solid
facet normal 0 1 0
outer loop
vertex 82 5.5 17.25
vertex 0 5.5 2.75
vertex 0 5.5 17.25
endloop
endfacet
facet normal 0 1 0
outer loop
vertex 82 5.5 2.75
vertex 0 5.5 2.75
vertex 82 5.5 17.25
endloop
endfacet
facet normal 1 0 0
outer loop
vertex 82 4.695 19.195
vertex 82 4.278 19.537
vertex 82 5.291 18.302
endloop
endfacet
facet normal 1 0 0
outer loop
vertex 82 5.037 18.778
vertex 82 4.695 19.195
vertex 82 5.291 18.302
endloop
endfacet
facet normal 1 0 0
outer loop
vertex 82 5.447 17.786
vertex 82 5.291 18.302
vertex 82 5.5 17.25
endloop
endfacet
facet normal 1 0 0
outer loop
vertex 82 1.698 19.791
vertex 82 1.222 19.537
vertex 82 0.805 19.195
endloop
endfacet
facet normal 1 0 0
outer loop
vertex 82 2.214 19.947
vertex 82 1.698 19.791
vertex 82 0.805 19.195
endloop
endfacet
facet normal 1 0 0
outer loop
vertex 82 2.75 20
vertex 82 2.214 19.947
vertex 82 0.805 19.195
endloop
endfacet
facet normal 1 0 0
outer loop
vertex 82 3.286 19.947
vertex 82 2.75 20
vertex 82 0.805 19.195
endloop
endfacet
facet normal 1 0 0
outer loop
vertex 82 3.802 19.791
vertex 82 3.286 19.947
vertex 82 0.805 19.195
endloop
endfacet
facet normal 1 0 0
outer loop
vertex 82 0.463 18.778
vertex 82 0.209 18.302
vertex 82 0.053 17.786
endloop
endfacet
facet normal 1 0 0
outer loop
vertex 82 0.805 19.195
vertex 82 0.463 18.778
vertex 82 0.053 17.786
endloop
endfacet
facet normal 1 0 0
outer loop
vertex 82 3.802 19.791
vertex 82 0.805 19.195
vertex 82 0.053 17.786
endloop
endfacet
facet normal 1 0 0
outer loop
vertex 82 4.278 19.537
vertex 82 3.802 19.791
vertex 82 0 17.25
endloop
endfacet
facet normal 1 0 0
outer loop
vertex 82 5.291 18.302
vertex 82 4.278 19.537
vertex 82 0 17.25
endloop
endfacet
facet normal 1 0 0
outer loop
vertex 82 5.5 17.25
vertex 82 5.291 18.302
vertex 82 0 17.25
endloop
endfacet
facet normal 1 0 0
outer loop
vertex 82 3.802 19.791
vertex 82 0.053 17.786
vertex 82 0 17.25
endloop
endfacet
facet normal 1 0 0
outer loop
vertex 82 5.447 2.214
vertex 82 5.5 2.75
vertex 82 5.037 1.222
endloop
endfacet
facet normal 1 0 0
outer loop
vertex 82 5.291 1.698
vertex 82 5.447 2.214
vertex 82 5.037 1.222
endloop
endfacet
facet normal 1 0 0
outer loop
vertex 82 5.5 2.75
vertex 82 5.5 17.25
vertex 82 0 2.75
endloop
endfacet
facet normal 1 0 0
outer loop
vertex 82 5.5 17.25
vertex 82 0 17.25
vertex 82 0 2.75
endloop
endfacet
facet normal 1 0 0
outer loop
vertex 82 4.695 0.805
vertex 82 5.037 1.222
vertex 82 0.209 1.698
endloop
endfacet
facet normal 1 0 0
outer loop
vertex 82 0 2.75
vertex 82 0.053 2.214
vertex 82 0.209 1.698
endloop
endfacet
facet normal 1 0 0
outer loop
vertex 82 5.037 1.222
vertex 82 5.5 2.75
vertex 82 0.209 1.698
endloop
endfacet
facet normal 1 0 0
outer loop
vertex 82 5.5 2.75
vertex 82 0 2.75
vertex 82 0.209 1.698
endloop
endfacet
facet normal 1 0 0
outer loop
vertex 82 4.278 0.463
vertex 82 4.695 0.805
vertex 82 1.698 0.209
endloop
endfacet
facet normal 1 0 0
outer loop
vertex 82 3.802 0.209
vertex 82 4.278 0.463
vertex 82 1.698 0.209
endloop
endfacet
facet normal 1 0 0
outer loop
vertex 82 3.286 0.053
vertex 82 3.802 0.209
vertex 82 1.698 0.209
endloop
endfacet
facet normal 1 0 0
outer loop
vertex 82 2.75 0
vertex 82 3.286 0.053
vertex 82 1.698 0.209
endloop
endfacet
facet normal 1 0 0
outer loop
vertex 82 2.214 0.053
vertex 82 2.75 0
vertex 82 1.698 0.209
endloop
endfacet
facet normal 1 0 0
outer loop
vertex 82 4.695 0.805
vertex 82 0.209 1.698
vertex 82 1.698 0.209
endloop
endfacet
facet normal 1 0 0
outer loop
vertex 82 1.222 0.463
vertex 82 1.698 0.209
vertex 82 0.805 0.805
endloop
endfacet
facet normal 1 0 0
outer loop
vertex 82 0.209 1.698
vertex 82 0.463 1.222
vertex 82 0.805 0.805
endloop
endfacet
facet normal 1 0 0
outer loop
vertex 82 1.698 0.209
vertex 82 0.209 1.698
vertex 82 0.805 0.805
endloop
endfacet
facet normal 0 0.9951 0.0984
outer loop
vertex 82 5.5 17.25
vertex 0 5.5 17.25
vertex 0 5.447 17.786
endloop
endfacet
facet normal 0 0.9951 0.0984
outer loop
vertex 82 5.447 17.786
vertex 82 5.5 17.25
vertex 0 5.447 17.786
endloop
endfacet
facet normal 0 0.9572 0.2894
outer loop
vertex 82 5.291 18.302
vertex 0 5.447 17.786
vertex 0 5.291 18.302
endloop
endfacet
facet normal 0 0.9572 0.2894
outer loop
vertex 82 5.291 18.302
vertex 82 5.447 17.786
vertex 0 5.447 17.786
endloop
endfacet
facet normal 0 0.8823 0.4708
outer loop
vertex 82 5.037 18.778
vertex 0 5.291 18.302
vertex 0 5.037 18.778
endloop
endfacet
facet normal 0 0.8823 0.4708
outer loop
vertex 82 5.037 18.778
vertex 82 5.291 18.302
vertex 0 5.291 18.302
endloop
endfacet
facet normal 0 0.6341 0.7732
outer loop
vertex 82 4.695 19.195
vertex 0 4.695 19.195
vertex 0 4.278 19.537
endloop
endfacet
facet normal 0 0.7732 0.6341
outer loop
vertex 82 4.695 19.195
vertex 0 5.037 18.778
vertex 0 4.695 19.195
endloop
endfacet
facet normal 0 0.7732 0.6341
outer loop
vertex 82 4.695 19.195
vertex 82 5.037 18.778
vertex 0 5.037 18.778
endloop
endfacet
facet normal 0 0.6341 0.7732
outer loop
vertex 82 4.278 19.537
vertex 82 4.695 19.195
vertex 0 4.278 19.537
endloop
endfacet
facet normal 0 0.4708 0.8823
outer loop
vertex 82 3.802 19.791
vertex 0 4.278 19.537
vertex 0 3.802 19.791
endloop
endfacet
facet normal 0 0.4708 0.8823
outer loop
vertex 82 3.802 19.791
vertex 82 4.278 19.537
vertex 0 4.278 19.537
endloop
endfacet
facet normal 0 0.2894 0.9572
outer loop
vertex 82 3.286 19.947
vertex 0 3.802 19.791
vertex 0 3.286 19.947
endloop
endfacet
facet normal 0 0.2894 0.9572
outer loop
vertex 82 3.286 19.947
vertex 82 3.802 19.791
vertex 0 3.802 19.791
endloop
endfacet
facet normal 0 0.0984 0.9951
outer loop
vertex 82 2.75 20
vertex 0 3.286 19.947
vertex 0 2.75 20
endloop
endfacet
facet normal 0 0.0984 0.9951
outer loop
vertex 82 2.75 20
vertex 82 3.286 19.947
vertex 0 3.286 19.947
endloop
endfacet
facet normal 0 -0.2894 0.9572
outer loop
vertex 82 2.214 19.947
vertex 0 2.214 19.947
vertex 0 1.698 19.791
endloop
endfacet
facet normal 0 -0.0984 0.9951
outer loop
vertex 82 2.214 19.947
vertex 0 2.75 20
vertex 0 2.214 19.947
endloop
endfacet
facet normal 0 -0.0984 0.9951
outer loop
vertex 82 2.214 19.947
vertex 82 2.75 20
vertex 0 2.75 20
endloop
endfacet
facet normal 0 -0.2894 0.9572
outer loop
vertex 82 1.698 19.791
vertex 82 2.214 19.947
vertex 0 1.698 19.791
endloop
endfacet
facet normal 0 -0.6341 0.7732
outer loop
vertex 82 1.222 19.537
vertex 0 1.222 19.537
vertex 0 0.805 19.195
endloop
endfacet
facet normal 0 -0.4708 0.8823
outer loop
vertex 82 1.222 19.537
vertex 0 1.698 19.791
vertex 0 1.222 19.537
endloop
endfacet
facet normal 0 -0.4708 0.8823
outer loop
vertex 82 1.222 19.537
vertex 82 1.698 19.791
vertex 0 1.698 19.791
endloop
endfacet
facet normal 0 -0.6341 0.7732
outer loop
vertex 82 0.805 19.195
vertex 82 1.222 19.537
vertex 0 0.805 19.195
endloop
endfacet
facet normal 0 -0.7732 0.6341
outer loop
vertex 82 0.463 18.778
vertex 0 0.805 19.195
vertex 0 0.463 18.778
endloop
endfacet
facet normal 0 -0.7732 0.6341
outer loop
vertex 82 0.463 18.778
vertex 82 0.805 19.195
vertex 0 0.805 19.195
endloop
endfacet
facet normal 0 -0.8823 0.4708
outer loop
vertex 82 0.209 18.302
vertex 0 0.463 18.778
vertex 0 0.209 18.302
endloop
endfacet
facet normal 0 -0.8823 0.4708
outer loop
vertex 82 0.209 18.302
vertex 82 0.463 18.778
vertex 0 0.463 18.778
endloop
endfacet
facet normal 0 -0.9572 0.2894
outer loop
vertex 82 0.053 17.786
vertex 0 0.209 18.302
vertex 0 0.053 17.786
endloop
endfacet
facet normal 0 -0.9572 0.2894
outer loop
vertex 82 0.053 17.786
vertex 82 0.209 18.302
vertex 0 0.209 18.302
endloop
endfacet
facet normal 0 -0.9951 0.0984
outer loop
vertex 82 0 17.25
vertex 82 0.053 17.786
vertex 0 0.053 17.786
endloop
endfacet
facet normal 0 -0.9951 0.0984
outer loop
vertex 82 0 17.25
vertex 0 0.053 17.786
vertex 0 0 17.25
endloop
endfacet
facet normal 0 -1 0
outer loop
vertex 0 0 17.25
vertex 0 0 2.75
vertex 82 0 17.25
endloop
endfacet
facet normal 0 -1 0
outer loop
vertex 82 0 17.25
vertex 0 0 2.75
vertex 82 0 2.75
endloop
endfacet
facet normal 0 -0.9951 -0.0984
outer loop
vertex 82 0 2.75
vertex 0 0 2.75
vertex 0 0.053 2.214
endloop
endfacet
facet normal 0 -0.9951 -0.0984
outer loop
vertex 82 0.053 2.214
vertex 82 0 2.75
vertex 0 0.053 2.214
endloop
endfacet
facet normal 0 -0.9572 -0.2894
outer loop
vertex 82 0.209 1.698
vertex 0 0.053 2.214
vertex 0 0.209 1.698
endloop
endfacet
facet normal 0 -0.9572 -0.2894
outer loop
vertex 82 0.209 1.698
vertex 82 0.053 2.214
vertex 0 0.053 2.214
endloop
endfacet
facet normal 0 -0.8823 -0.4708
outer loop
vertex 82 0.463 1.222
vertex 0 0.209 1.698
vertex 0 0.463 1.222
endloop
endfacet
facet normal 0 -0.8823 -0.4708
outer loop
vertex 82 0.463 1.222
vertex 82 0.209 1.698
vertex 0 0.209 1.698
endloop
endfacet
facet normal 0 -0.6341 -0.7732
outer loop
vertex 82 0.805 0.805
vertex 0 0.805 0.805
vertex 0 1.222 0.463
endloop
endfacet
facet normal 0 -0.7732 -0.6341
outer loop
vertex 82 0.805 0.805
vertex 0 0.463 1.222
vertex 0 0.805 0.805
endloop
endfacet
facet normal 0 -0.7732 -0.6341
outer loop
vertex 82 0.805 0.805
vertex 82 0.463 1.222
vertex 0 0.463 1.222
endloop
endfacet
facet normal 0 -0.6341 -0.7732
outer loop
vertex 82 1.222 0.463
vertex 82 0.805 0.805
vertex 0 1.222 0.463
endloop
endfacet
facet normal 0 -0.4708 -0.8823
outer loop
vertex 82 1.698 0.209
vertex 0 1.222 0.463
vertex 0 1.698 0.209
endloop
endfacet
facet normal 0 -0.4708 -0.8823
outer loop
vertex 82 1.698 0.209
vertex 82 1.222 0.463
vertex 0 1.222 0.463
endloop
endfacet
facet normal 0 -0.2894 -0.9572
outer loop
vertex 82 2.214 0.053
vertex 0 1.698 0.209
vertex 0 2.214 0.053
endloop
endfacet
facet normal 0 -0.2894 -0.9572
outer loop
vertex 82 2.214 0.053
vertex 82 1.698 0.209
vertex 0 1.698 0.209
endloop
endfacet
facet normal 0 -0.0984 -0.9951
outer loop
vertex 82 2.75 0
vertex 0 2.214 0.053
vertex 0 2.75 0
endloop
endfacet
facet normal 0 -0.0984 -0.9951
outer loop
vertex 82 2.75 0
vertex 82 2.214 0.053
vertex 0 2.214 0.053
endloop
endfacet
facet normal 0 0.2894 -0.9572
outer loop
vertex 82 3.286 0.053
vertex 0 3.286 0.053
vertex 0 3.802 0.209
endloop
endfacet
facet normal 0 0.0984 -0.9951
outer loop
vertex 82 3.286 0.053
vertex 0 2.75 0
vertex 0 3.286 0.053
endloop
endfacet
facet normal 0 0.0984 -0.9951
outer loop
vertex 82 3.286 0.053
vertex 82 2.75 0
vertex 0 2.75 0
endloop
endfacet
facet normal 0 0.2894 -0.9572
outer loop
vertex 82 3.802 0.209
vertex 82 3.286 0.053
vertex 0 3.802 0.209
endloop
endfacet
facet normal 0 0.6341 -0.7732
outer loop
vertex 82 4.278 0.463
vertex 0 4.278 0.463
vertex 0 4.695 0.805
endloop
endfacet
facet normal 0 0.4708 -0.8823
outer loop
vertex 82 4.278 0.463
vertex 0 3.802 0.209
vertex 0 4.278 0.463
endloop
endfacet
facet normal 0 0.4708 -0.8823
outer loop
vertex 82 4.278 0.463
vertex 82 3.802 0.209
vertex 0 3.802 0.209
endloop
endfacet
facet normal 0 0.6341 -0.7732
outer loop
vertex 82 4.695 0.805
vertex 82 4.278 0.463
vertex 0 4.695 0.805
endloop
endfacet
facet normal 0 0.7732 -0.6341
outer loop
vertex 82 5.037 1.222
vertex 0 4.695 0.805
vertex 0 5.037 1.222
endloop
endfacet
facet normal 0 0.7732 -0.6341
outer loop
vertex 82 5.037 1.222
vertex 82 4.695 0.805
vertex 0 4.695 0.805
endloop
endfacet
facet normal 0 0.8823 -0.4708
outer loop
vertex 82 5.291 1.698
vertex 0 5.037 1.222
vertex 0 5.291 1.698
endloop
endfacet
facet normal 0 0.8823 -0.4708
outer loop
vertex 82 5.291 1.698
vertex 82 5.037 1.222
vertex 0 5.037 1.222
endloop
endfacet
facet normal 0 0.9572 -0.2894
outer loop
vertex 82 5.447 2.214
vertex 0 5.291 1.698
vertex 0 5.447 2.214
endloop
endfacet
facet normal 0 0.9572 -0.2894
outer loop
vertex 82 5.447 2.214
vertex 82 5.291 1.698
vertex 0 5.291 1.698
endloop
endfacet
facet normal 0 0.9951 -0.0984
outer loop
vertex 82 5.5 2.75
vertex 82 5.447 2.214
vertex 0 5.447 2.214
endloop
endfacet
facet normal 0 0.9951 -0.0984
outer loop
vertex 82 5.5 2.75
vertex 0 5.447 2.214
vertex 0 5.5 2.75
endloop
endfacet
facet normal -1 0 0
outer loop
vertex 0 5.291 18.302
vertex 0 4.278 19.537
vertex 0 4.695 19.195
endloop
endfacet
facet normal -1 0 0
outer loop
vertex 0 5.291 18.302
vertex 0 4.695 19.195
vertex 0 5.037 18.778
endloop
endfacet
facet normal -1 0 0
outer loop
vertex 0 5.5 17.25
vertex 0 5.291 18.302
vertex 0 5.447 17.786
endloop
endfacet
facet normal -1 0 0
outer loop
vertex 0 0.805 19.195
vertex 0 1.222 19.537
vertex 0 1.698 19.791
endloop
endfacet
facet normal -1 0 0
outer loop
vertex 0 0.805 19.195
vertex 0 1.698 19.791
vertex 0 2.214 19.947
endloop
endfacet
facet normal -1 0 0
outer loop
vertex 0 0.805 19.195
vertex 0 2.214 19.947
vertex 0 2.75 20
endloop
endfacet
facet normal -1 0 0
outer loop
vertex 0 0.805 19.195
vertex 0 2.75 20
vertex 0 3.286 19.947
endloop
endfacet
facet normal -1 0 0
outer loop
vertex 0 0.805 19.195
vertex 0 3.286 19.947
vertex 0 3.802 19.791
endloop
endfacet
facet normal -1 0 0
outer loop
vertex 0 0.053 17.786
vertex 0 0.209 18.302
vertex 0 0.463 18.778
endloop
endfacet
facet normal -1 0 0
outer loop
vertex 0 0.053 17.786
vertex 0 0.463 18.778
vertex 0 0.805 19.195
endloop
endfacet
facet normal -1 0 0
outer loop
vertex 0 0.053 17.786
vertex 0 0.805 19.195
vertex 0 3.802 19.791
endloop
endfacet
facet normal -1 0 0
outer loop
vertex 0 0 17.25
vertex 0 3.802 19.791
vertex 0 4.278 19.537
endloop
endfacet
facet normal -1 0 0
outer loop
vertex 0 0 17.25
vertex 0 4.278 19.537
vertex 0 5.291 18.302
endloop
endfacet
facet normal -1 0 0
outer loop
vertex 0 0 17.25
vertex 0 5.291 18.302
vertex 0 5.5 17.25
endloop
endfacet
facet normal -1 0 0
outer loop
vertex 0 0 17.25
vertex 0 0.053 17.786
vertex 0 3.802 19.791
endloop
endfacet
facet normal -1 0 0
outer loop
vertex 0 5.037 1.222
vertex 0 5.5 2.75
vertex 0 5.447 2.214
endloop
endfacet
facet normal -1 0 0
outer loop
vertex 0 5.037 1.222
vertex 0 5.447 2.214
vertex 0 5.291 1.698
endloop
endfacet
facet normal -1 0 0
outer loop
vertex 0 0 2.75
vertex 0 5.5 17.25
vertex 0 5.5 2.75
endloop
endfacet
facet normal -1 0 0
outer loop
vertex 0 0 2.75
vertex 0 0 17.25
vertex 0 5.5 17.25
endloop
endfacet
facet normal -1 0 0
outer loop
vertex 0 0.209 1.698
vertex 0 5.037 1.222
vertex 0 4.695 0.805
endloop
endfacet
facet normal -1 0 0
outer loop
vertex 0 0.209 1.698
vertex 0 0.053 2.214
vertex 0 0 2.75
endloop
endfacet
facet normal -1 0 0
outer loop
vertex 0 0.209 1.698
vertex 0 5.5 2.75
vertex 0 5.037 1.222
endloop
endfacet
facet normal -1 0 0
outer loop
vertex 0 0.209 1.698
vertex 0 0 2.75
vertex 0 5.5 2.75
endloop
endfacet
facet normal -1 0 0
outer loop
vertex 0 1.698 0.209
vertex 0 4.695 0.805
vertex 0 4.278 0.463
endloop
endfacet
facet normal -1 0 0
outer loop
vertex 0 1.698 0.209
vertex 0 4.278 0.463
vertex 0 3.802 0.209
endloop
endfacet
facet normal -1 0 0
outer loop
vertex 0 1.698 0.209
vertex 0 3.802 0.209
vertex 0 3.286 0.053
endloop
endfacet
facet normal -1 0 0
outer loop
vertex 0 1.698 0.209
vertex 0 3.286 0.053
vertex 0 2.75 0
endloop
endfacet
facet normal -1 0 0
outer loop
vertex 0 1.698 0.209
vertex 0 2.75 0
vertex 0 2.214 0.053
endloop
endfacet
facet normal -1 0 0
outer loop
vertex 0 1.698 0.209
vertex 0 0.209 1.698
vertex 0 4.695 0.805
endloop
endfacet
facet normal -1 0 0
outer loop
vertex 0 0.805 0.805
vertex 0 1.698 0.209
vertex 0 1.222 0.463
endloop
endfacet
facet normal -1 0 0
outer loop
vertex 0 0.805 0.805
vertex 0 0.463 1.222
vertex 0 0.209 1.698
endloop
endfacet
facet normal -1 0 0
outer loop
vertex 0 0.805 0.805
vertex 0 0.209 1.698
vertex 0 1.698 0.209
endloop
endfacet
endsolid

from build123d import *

# Parameters (mm, degrees)
SKETCH_1_W      = 82
SKETCH_1_H      = 20
EXTRUDE_1_DEPTH = 5.5
FILLET_1_RADIUS = 2.75
FILLET_1_LENGTH = 82
FILLET_2_RADIUS = 2.75
FILLET_2_LENGTH = 82


with BuildPart() as part:
    # 草图1 → 凸台-拉伸1 (new body)
    with BuildSketch(Plane(origin=(0, 0, 0), x_dir=(1, 0, 0), z_dir=(0, 1, 0))):
        with Locations((41, -10)):
            Rectangle(SKETCH_1_W, SKETCH_1_H)
    extrude(amount=EXTRUDE_1_DEPTH)

    # 圆角1: full round fillet: the end face becomes a half cylinder, R = half its width
    fillet_1_face = Plane((41, 2.75, 0), x_dir=(1, 0, 0), z_dir=(0, 0, -1))  # on the end face: x along it, z out of the body
    fillet_1_slab = fillet_1_face.offset(-FILLET_1_RADIUS / 2) * Box(FILLET_1_LENGTH, 2 * FILLET_1_RADIUS, FILLET_1_RADIUS, mode=Mode.PRIVATE)  # the body's end, R deep
    fillet_1_round = Plane((41, 2.75, 2.75), x_dir=(0, 0, -1), z_dir=(1, 0, 0)) * Cylinder(FILLET_1_RADIUS, FILLET_1_LENGTH, mode=Mode.PRIVATE)  # its axis R under the face
    add(fillet_1_slab - fillet_1_round, mode=Mode.SUBTRACT)

    # 圆角2: full round fillet: the end face becomes a half cylinder, R = half its width
    fillet_2_face = Plane((41, 2.75, 20), x_dir=(1, 0, 0), z_dir=(0, 0, 1))  # on the end face: x along it, z out of the body
    fillet_2_slab = fillet_2_face.offset(-FILLET_2_RADIUS / 2) * Box(FILLET_2_LENGTH, 2 * FILLET_2_RADIUS, FILLET_2_RADIUS, mode=Mode.PRIVATE)  # the body's end, R deep
    fillet_2_round = Plane((41, 2.75, 17.25), x_dir=(0, 0, 1), z_dir=(1, 0, 0)) * Cylinder(FILLET_2_RADIUS, FILLET_2_LENGTH, mode=Mode.PRIVATE)  # its axis R under the face
    add(fillet_2_slab - fillet_2_round, mode=Mode.SUBTRACT)


solid = part.part
